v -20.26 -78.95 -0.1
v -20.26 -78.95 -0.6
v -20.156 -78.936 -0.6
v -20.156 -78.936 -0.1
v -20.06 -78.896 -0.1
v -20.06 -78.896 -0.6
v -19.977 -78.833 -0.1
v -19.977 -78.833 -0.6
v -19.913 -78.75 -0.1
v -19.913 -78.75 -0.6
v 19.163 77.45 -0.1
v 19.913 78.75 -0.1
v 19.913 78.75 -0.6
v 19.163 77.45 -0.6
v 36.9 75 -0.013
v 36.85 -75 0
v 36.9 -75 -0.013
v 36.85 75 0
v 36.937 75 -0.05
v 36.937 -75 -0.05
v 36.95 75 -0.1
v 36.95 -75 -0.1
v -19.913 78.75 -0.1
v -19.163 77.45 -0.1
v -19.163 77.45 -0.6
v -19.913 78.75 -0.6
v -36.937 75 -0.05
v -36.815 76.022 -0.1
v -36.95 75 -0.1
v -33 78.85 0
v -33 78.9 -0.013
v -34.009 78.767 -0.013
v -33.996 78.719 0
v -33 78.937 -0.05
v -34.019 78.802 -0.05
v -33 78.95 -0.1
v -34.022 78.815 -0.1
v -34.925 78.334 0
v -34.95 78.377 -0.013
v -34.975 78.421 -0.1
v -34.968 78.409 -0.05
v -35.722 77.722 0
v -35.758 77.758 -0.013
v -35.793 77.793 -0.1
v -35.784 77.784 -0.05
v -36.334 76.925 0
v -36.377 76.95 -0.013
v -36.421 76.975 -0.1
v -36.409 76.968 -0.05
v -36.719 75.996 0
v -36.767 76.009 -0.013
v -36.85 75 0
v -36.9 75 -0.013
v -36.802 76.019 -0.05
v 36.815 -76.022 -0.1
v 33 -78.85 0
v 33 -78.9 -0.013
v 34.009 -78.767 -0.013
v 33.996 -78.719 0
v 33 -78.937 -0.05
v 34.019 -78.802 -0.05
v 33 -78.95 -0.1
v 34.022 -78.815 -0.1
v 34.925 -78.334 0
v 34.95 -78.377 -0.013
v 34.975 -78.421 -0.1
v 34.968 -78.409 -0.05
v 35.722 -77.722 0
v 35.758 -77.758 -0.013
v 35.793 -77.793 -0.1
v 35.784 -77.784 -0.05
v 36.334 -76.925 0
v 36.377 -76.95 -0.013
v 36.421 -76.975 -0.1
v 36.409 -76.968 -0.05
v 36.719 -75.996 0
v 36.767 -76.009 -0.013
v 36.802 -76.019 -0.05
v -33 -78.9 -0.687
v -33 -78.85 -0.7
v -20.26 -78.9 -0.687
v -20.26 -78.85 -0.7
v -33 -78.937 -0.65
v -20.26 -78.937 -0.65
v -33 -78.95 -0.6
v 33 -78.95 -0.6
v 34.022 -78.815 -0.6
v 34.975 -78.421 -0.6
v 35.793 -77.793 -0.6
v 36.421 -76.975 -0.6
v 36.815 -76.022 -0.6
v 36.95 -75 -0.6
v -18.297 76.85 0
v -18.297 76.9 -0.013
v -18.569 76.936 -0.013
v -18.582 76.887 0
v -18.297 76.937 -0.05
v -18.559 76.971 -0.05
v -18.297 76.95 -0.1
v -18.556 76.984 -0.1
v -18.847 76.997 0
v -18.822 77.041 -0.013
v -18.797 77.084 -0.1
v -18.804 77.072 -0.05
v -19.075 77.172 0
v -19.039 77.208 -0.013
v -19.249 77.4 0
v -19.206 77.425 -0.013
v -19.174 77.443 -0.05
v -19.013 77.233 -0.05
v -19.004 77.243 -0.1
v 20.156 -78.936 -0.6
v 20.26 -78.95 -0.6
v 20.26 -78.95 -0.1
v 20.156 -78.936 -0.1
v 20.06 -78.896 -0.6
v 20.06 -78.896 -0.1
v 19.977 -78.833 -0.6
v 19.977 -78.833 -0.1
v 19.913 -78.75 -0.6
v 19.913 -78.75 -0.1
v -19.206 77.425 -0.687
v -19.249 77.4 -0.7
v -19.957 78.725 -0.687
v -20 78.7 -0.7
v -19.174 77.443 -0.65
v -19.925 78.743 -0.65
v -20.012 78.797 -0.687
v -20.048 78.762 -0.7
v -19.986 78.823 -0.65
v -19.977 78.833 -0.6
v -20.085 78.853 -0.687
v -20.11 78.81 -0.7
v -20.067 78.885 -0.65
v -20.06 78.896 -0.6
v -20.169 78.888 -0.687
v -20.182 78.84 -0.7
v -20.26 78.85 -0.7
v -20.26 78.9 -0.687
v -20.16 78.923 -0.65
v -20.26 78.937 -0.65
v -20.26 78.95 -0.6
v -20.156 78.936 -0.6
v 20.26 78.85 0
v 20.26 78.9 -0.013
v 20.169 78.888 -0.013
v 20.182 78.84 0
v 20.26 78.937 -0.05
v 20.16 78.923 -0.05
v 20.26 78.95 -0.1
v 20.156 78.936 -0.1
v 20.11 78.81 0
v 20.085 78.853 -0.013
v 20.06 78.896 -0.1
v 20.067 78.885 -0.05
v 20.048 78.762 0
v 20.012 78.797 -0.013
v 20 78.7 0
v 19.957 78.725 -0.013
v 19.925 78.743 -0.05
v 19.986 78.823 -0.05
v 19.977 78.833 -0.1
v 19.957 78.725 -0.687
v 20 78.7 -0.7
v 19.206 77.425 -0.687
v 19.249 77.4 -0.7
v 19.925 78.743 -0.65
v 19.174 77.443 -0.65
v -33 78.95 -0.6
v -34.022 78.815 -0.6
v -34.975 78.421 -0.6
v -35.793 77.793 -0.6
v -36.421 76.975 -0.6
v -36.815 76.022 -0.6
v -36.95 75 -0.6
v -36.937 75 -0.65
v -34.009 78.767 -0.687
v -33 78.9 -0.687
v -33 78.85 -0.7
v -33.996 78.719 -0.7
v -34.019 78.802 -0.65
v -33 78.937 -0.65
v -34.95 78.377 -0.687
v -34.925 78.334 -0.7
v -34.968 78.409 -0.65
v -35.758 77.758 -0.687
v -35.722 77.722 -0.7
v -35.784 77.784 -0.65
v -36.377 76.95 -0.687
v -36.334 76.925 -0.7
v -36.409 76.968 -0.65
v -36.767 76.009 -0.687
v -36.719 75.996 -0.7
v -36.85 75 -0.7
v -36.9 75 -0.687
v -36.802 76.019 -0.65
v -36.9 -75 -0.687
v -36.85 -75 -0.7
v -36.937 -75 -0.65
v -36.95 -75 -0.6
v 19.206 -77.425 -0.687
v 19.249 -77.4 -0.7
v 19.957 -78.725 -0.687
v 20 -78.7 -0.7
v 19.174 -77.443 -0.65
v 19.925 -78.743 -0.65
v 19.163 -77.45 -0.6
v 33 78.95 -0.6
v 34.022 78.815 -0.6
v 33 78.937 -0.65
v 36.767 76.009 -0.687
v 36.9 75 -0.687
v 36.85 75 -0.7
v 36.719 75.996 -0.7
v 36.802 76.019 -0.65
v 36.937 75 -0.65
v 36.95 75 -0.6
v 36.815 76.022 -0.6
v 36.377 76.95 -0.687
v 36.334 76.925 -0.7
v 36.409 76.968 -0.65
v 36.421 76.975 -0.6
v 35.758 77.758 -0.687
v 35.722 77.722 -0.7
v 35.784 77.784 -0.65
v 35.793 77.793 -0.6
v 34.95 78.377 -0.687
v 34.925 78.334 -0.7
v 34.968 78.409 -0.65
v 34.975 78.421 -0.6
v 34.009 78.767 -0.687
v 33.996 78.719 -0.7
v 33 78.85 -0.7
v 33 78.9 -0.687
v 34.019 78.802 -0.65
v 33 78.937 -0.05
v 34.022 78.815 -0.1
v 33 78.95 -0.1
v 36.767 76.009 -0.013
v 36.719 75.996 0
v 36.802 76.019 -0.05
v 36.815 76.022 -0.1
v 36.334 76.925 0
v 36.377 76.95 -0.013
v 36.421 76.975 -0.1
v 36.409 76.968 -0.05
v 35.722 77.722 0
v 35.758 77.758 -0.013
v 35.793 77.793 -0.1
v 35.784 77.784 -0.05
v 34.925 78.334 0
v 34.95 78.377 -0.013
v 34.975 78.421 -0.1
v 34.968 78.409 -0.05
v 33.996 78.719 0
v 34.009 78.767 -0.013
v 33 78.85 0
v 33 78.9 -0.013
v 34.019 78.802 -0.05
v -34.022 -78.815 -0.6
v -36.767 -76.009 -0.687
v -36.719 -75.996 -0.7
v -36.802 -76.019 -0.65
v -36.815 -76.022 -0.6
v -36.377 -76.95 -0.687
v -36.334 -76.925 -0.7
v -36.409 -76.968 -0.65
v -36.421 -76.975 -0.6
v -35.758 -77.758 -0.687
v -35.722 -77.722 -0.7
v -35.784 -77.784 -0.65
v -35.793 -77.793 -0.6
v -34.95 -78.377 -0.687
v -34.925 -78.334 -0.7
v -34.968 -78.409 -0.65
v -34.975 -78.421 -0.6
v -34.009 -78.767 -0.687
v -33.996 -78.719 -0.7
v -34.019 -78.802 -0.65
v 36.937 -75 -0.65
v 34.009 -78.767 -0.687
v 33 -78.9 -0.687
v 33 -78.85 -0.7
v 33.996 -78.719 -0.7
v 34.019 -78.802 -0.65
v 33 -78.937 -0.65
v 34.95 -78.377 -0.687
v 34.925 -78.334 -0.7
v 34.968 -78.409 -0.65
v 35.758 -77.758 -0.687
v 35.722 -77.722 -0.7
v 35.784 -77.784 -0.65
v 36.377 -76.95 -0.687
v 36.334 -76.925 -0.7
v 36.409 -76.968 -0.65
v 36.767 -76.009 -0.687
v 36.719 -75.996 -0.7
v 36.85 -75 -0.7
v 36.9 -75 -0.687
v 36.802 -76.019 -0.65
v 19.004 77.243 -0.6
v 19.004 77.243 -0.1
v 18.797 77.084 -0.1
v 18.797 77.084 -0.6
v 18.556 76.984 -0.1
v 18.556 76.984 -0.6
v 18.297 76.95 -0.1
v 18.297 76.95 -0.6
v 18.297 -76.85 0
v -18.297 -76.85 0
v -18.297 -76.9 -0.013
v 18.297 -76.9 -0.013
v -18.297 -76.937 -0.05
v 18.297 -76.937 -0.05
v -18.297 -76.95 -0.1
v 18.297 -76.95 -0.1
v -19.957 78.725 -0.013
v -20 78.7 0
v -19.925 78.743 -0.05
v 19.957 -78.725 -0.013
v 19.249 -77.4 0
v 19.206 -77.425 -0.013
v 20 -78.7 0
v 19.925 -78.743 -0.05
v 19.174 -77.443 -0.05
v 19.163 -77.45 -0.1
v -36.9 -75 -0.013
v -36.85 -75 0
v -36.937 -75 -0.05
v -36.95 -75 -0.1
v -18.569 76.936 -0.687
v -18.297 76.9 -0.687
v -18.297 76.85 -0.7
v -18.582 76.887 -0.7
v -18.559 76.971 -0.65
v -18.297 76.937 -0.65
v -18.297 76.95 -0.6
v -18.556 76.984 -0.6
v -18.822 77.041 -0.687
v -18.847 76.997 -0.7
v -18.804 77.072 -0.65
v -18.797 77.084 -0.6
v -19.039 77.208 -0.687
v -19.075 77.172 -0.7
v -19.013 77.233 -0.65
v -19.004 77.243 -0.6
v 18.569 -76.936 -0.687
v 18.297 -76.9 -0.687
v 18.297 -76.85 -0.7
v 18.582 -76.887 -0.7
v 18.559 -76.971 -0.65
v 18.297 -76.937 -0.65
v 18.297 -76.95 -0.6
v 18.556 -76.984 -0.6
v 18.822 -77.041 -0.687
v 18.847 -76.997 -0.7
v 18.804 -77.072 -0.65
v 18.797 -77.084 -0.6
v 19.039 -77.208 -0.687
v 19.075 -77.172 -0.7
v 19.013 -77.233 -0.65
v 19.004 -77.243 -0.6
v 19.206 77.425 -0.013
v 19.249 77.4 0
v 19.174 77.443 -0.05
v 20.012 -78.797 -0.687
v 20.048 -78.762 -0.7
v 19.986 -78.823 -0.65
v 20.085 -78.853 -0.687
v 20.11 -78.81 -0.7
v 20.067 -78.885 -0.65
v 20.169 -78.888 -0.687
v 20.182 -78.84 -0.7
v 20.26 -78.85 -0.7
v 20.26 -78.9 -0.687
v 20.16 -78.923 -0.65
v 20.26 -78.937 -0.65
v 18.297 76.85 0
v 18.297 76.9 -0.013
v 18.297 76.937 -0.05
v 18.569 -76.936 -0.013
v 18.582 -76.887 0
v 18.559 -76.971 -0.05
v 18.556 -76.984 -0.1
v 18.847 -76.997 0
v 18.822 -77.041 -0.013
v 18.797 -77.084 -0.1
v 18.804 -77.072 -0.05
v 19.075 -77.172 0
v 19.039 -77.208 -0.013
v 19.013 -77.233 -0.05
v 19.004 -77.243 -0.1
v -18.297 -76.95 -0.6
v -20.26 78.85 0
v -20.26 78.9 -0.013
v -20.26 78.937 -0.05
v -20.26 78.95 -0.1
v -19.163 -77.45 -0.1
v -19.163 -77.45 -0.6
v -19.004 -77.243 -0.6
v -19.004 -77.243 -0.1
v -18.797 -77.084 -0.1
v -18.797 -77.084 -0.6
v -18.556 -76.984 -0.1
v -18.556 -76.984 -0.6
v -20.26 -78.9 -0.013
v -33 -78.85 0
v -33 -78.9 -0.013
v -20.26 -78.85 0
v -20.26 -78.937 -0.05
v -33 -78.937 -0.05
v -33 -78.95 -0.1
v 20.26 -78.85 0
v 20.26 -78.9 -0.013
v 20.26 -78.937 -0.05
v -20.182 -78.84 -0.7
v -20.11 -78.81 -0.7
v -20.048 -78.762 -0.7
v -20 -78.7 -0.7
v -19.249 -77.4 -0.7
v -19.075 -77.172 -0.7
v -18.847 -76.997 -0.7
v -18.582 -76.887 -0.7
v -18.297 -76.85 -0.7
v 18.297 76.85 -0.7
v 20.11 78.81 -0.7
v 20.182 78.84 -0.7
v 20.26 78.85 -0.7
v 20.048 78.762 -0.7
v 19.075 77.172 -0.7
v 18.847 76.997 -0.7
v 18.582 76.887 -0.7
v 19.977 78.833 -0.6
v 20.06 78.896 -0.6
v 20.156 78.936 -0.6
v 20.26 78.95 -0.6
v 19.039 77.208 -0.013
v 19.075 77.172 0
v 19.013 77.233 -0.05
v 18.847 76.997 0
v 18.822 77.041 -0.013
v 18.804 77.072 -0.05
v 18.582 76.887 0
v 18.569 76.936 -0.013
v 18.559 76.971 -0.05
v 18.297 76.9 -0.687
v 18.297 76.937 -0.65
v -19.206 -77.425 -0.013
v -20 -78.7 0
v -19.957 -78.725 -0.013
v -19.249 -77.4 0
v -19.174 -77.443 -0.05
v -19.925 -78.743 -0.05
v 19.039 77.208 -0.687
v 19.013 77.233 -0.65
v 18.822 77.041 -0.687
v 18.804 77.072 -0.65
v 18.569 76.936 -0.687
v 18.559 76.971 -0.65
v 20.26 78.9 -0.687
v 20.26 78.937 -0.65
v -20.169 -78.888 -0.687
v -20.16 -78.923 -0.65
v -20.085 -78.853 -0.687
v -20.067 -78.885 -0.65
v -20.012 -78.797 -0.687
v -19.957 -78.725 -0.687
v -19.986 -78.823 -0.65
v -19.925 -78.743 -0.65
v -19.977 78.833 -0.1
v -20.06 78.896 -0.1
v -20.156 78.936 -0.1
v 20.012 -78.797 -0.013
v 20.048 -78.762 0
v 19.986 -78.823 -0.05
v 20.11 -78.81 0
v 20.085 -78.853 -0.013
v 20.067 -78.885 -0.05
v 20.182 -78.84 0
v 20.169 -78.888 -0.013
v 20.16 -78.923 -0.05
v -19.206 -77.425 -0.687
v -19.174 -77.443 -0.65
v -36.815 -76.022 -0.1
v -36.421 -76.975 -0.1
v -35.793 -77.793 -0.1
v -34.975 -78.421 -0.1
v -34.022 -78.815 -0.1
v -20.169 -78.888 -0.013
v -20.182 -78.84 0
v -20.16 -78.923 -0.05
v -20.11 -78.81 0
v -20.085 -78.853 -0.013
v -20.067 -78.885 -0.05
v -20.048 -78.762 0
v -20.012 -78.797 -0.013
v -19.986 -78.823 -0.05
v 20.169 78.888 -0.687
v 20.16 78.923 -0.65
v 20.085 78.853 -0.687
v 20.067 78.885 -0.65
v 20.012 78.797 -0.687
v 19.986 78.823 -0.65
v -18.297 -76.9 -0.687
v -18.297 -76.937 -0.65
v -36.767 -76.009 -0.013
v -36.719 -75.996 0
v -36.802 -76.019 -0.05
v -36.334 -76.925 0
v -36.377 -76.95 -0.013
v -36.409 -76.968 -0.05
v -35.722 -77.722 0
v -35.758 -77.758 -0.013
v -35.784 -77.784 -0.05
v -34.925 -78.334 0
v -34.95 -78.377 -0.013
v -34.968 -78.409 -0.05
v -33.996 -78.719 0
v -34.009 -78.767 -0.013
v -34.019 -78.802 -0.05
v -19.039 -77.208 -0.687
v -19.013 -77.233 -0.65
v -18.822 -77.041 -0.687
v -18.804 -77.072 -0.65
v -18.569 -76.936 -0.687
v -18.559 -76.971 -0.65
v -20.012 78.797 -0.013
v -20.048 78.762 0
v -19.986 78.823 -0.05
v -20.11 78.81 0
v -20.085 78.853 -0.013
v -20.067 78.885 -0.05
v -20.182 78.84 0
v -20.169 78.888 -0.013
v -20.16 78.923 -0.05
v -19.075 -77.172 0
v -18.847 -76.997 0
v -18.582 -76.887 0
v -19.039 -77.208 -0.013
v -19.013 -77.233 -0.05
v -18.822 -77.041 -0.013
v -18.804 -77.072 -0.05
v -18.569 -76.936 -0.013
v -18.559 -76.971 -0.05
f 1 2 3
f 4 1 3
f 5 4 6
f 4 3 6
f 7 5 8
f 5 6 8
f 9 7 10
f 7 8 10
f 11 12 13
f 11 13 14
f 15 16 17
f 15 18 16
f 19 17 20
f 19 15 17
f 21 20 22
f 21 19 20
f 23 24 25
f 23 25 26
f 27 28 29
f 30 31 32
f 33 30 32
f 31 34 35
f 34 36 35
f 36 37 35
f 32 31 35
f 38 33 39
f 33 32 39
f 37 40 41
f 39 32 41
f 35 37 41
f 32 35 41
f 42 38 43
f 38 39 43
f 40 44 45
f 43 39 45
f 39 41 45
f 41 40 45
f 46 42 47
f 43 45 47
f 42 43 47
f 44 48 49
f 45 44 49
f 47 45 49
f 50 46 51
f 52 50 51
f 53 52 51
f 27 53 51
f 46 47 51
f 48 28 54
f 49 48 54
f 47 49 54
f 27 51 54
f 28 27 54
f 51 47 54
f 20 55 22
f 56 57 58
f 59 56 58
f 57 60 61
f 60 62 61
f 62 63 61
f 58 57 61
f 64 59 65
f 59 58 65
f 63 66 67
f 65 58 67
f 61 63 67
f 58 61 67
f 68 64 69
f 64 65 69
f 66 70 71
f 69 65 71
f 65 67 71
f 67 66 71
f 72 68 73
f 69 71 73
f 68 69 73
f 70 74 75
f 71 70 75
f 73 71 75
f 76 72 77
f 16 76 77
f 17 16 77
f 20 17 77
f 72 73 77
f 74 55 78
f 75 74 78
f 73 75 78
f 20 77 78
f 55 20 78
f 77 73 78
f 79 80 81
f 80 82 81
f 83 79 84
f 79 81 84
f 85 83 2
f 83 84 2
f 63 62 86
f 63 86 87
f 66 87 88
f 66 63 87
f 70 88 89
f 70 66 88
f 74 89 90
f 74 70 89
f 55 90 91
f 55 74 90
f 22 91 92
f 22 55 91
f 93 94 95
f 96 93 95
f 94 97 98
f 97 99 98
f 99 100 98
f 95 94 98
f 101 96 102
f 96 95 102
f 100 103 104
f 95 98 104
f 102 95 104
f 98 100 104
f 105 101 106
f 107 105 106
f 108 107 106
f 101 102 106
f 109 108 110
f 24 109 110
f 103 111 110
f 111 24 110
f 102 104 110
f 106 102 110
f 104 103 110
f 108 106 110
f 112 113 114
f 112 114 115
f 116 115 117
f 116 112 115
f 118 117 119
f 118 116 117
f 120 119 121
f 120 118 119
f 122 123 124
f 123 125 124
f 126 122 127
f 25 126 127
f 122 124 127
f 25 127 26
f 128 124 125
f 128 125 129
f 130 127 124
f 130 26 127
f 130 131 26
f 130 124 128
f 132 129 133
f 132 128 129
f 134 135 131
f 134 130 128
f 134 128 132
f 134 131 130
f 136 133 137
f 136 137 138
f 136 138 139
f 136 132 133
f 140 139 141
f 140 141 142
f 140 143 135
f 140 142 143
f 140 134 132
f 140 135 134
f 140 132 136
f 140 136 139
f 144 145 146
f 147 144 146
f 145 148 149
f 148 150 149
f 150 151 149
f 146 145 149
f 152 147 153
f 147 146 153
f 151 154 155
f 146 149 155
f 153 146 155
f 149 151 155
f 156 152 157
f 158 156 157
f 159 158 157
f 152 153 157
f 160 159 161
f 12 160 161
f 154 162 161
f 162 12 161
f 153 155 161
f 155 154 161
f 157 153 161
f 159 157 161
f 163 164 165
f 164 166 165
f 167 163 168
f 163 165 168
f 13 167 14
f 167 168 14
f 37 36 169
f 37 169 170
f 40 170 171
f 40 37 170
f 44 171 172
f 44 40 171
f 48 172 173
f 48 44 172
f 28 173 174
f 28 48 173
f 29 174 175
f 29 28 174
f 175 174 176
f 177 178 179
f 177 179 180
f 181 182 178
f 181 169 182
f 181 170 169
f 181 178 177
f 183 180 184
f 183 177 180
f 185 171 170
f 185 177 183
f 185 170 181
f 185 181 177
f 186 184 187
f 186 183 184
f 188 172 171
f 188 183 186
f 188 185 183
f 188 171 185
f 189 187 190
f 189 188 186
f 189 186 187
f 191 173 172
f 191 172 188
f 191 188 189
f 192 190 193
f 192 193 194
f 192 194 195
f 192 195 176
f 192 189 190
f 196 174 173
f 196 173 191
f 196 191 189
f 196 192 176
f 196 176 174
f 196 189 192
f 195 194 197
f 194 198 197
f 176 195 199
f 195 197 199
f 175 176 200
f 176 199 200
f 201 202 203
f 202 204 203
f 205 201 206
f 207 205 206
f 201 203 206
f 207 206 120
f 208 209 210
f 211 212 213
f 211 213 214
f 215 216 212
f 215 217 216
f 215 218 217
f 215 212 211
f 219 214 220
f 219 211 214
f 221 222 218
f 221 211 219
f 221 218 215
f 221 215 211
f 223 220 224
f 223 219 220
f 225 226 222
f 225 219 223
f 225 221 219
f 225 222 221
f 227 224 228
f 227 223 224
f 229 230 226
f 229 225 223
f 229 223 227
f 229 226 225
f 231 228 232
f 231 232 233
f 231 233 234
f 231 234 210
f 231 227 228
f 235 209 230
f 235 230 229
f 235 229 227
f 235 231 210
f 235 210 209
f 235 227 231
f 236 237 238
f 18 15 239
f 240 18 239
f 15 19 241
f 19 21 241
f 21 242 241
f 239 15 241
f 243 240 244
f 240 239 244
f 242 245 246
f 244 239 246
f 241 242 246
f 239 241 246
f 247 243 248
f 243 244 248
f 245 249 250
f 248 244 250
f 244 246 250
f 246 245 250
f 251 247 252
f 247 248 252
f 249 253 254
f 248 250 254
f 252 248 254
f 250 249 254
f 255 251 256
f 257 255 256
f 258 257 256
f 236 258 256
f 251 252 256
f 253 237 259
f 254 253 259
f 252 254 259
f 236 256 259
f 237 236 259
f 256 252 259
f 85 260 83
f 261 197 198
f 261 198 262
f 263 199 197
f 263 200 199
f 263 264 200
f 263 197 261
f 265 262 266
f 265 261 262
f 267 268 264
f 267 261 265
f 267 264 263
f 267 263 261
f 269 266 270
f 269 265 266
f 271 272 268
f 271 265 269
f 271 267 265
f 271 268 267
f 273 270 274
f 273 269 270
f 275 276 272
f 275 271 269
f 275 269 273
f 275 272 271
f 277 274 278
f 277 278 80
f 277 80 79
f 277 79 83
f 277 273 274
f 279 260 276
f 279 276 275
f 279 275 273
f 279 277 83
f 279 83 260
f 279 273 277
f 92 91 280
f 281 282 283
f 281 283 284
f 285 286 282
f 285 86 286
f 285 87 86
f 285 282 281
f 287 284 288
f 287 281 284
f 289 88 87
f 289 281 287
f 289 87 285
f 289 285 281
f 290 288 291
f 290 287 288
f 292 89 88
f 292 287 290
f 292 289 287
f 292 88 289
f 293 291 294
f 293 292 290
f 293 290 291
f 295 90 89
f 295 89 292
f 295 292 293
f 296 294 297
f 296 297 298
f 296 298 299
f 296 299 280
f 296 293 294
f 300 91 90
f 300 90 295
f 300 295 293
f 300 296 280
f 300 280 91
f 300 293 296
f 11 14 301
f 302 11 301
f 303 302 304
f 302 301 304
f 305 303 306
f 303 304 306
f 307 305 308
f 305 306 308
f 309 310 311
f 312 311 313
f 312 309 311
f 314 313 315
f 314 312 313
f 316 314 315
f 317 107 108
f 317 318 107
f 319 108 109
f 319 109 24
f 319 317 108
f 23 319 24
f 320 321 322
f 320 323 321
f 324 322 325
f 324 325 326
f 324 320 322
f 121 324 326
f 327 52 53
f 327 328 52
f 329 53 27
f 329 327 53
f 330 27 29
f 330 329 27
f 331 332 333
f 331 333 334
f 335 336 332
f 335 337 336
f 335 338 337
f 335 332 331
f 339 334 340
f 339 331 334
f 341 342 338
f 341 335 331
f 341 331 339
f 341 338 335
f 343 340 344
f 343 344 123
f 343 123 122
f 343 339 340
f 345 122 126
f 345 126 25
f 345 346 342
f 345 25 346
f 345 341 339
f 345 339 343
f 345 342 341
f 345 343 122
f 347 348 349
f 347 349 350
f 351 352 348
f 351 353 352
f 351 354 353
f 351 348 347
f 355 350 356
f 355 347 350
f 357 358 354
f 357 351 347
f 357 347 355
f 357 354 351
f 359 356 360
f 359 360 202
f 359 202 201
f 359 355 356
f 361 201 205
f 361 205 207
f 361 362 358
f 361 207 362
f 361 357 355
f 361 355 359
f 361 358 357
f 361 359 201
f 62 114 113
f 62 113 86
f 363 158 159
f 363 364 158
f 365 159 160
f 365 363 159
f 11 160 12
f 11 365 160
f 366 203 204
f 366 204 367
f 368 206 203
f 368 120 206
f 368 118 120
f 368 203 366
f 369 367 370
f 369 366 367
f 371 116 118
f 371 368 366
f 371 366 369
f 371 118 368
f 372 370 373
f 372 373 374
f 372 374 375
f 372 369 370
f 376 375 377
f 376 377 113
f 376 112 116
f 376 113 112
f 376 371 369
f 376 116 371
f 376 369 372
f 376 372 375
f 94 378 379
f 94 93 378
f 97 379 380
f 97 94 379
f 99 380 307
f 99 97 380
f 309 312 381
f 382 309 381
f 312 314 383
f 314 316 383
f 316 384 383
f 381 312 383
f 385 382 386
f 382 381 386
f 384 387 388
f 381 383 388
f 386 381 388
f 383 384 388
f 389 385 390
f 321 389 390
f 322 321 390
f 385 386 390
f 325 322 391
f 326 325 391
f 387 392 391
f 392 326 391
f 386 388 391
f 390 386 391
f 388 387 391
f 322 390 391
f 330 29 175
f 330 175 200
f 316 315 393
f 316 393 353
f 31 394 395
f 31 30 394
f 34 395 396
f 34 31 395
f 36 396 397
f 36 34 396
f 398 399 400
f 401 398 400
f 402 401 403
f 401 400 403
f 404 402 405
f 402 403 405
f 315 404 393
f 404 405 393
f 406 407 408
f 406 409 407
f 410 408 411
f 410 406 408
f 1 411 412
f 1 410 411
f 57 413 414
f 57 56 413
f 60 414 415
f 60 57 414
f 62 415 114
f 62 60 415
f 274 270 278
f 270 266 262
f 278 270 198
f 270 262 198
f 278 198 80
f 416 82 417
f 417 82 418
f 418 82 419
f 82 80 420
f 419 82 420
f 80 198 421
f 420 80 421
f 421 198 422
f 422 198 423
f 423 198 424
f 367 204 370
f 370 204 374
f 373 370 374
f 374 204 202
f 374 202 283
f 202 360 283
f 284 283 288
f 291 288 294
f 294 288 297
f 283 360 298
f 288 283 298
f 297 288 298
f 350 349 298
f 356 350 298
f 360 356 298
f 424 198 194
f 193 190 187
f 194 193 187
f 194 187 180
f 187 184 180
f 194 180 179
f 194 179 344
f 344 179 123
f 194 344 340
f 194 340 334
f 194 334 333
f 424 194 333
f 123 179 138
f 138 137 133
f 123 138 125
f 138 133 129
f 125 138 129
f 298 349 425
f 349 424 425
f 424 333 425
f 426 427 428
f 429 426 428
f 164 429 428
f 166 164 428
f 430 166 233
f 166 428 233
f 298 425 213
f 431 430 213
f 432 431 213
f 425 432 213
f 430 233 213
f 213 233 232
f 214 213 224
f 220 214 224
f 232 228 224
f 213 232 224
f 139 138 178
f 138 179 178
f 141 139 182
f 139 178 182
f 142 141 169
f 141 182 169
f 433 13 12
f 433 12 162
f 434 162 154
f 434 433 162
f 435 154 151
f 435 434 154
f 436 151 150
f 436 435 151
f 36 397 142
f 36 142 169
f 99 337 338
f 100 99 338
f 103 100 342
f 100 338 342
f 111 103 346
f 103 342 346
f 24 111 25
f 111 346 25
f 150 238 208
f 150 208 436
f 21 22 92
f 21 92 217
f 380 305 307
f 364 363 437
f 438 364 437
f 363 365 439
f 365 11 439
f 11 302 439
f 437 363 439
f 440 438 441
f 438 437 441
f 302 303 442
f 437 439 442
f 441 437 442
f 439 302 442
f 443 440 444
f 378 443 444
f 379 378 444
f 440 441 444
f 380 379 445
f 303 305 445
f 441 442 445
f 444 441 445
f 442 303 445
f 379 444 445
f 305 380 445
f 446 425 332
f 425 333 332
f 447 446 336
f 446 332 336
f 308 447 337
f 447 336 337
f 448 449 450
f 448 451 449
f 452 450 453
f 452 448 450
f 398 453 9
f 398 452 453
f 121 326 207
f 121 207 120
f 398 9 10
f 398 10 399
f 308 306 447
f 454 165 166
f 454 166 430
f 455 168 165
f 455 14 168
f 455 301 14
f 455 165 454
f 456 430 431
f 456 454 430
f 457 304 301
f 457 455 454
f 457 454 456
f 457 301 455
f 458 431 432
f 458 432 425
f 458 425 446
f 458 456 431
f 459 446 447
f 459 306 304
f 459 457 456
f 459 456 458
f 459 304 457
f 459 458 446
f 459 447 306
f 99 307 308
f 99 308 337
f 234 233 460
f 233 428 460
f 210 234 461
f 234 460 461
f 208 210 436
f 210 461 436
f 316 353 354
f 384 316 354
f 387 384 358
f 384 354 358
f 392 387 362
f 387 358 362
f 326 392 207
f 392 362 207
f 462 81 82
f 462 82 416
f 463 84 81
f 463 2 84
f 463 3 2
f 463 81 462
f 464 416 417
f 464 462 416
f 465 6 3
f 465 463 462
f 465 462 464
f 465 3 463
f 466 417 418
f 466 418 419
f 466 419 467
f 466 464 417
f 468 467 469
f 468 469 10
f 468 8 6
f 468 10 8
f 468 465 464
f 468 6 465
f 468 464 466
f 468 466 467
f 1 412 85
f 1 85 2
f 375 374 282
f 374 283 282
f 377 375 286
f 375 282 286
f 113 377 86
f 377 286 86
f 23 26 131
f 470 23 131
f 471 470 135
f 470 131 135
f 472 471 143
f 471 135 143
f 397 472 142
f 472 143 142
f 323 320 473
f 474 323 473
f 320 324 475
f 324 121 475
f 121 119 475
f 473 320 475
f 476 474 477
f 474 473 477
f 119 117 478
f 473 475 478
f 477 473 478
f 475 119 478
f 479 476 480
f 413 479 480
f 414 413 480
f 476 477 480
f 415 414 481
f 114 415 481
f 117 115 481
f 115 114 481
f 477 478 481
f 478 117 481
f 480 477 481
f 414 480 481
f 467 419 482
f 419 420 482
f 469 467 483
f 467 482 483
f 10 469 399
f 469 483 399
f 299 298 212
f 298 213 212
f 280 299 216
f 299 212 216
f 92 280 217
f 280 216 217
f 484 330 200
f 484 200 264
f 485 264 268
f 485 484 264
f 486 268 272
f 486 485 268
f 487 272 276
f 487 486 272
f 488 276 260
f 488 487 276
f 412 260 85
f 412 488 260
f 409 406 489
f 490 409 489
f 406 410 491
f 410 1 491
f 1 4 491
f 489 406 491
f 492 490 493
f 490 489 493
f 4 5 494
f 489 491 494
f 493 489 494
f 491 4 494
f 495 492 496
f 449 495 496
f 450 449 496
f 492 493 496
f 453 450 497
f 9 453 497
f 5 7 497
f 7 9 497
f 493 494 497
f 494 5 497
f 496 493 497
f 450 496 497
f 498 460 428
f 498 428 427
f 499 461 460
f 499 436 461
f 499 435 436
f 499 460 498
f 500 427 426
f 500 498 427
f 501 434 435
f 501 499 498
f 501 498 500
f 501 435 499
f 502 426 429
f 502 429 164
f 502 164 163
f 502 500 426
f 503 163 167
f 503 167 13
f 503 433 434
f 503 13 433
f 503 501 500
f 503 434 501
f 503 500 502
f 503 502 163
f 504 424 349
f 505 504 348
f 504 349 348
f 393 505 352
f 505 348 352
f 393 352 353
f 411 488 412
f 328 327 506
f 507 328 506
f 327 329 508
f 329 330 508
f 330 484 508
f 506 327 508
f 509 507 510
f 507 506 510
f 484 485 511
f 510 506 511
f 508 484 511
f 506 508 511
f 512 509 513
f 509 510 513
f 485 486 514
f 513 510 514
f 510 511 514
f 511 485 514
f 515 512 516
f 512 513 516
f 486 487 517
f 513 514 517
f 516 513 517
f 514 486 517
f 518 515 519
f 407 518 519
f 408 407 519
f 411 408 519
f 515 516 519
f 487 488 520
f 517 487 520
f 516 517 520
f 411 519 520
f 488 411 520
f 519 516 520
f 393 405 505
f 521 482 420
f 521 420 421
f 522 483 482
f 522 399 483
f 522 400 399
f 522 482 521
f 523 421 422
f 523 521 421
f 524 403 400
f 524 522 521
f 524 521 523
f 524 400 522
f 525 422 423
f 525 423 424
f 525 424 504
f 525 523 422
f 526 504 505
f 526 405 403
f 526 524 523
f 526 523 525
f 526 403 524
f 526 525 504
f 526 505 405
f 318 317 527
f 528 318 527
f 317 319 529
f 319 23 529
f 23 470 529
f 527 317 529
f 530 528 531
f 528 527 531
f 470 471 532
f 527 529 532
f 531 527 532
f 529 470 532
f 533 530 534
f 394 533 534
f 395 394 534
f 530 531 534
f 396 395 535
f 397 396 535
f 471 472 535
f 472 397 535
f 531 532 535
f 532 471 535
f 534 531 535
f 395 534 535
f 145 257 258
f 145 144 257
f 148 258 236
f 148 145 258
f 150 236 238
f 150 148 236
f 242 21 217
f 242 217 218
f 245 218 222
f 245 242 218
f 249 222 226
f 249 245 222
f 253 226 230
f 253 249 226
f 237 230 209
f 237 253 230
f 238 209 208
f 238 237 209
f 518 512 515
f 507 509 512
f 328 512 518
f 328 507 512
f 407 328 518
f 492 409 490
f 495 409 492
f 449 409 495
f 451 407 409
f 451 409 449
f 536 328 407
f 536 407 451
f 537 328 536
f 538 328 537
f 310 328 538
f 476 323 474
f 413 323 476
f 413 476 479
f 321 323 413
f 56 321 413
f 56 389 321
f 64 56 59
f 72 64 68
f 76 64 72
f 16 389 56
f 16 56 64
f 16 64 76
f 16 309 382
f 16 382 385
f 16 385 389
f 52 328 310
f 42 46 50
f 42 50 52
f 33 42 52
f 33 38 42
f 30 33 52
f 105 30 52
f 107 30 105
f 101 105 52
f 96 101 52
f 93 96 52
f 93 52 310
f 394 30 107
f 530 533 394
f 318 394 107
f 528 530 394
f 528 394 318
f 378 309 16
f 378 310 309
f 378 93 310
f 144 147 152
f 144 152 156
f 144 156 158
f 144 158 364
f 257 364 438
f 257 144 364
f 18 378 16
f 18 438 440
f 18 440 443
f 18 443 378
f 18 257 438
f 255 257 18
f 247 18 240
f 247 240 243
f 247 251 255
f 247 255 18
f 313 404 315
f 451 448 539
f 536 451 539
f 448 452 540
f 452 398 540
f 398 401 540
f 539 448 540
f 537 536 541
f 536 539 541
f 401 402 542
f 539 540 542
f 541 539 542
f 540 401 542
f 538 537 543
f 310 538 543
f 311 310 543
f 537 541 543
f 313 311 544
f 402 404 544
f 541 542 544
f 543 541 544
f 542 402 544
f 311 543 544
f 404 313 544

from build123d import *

# Parameters (mm, degrees)
F1_DEPTH = 0.7
F2_R     = 1
F3_R     = 0.4
F4_R     = 0.1


with BuildPart() as f1:
    # F0 (on Top) → F1 (new body)
    with BuildSketch(Plane.XY):
        with BuildLine():
            Line((33, 78.95), (20.028868, 78.95))
            Line((20.028868, 78.95), (18.874167, 76.95))
            Line((18.874167, 76.95), (-18.874167, 76.95))
            Line((-18.874167, 76.95), (-20.028868, 78.95))
            Line((-20.028868, 78.95), (-33, 78.95))
            ThreePointArc((-33, 78.95), (-35.793072, 77.793072), (-36.95, 75))
            Line((-36.95, 75), (-36.95, 0))
            Line((-36.95, 0), (-36.95, -75))
            ThreePointArc((-36.95, -75), (-35.793072, -77.793072), (-33, -78.95))
            Line((-33, -78.95), (-20.028868, -78.95))
            Line((-20.028868, -78.95), (-18.874167, -76.95))
            Line((-18.874167, -76.95), (18.874167, -76.95))
            Line((18.874167, -76.95), (20.028868, -78.95))
            Line((20.028868, -78.95), (33, -78.95))
            ThreePointArc((33, -78.95), (35.793072, -77.793072), (36.95, -75))
            Line((36.95, -75), (36.95, 0))
            Line((36.95, 0), (36.95, 75))
            ThreePointArc((36.95, 75), (35.793072, 77.793072), (33, 78.95))
        make_face()
    extrude(amount=-F1_DEPTH)

    # F2
    f2_edges = [f1.edges().sort_by_distance(p)[0] for p in [
        (-18.874167, 76.95, -0.35),
        (18.874167, 76.95, -0.35),
        (18.874167, -76.95, -0.35),
        (-18.874167, -76.95, -0.35),
    ]]
    fillet(f2_edges, radius=F2_R)

    # F3
    f3_edges = [f1.edges().sort_by_distance(p)[0] for p in [
        (-20.028868, -78.95, -0.35),
        (20.028868, -78.95, -0.35),
        (20.028868, 78.95, -0.35),
        (-20.028868, 78.95, -0.35),
    ]]
    fillet(f3_edges, radius=F3_R)

    # F4
    f4_edges = [f1.edges().sort_by_distance(p)[0] for p in [
        (0, 76.95, 0),
        (0, 76.95, -0.7),
    ]]
    fillet(f4_edges, radius=F4_R)


solid = f1.part
